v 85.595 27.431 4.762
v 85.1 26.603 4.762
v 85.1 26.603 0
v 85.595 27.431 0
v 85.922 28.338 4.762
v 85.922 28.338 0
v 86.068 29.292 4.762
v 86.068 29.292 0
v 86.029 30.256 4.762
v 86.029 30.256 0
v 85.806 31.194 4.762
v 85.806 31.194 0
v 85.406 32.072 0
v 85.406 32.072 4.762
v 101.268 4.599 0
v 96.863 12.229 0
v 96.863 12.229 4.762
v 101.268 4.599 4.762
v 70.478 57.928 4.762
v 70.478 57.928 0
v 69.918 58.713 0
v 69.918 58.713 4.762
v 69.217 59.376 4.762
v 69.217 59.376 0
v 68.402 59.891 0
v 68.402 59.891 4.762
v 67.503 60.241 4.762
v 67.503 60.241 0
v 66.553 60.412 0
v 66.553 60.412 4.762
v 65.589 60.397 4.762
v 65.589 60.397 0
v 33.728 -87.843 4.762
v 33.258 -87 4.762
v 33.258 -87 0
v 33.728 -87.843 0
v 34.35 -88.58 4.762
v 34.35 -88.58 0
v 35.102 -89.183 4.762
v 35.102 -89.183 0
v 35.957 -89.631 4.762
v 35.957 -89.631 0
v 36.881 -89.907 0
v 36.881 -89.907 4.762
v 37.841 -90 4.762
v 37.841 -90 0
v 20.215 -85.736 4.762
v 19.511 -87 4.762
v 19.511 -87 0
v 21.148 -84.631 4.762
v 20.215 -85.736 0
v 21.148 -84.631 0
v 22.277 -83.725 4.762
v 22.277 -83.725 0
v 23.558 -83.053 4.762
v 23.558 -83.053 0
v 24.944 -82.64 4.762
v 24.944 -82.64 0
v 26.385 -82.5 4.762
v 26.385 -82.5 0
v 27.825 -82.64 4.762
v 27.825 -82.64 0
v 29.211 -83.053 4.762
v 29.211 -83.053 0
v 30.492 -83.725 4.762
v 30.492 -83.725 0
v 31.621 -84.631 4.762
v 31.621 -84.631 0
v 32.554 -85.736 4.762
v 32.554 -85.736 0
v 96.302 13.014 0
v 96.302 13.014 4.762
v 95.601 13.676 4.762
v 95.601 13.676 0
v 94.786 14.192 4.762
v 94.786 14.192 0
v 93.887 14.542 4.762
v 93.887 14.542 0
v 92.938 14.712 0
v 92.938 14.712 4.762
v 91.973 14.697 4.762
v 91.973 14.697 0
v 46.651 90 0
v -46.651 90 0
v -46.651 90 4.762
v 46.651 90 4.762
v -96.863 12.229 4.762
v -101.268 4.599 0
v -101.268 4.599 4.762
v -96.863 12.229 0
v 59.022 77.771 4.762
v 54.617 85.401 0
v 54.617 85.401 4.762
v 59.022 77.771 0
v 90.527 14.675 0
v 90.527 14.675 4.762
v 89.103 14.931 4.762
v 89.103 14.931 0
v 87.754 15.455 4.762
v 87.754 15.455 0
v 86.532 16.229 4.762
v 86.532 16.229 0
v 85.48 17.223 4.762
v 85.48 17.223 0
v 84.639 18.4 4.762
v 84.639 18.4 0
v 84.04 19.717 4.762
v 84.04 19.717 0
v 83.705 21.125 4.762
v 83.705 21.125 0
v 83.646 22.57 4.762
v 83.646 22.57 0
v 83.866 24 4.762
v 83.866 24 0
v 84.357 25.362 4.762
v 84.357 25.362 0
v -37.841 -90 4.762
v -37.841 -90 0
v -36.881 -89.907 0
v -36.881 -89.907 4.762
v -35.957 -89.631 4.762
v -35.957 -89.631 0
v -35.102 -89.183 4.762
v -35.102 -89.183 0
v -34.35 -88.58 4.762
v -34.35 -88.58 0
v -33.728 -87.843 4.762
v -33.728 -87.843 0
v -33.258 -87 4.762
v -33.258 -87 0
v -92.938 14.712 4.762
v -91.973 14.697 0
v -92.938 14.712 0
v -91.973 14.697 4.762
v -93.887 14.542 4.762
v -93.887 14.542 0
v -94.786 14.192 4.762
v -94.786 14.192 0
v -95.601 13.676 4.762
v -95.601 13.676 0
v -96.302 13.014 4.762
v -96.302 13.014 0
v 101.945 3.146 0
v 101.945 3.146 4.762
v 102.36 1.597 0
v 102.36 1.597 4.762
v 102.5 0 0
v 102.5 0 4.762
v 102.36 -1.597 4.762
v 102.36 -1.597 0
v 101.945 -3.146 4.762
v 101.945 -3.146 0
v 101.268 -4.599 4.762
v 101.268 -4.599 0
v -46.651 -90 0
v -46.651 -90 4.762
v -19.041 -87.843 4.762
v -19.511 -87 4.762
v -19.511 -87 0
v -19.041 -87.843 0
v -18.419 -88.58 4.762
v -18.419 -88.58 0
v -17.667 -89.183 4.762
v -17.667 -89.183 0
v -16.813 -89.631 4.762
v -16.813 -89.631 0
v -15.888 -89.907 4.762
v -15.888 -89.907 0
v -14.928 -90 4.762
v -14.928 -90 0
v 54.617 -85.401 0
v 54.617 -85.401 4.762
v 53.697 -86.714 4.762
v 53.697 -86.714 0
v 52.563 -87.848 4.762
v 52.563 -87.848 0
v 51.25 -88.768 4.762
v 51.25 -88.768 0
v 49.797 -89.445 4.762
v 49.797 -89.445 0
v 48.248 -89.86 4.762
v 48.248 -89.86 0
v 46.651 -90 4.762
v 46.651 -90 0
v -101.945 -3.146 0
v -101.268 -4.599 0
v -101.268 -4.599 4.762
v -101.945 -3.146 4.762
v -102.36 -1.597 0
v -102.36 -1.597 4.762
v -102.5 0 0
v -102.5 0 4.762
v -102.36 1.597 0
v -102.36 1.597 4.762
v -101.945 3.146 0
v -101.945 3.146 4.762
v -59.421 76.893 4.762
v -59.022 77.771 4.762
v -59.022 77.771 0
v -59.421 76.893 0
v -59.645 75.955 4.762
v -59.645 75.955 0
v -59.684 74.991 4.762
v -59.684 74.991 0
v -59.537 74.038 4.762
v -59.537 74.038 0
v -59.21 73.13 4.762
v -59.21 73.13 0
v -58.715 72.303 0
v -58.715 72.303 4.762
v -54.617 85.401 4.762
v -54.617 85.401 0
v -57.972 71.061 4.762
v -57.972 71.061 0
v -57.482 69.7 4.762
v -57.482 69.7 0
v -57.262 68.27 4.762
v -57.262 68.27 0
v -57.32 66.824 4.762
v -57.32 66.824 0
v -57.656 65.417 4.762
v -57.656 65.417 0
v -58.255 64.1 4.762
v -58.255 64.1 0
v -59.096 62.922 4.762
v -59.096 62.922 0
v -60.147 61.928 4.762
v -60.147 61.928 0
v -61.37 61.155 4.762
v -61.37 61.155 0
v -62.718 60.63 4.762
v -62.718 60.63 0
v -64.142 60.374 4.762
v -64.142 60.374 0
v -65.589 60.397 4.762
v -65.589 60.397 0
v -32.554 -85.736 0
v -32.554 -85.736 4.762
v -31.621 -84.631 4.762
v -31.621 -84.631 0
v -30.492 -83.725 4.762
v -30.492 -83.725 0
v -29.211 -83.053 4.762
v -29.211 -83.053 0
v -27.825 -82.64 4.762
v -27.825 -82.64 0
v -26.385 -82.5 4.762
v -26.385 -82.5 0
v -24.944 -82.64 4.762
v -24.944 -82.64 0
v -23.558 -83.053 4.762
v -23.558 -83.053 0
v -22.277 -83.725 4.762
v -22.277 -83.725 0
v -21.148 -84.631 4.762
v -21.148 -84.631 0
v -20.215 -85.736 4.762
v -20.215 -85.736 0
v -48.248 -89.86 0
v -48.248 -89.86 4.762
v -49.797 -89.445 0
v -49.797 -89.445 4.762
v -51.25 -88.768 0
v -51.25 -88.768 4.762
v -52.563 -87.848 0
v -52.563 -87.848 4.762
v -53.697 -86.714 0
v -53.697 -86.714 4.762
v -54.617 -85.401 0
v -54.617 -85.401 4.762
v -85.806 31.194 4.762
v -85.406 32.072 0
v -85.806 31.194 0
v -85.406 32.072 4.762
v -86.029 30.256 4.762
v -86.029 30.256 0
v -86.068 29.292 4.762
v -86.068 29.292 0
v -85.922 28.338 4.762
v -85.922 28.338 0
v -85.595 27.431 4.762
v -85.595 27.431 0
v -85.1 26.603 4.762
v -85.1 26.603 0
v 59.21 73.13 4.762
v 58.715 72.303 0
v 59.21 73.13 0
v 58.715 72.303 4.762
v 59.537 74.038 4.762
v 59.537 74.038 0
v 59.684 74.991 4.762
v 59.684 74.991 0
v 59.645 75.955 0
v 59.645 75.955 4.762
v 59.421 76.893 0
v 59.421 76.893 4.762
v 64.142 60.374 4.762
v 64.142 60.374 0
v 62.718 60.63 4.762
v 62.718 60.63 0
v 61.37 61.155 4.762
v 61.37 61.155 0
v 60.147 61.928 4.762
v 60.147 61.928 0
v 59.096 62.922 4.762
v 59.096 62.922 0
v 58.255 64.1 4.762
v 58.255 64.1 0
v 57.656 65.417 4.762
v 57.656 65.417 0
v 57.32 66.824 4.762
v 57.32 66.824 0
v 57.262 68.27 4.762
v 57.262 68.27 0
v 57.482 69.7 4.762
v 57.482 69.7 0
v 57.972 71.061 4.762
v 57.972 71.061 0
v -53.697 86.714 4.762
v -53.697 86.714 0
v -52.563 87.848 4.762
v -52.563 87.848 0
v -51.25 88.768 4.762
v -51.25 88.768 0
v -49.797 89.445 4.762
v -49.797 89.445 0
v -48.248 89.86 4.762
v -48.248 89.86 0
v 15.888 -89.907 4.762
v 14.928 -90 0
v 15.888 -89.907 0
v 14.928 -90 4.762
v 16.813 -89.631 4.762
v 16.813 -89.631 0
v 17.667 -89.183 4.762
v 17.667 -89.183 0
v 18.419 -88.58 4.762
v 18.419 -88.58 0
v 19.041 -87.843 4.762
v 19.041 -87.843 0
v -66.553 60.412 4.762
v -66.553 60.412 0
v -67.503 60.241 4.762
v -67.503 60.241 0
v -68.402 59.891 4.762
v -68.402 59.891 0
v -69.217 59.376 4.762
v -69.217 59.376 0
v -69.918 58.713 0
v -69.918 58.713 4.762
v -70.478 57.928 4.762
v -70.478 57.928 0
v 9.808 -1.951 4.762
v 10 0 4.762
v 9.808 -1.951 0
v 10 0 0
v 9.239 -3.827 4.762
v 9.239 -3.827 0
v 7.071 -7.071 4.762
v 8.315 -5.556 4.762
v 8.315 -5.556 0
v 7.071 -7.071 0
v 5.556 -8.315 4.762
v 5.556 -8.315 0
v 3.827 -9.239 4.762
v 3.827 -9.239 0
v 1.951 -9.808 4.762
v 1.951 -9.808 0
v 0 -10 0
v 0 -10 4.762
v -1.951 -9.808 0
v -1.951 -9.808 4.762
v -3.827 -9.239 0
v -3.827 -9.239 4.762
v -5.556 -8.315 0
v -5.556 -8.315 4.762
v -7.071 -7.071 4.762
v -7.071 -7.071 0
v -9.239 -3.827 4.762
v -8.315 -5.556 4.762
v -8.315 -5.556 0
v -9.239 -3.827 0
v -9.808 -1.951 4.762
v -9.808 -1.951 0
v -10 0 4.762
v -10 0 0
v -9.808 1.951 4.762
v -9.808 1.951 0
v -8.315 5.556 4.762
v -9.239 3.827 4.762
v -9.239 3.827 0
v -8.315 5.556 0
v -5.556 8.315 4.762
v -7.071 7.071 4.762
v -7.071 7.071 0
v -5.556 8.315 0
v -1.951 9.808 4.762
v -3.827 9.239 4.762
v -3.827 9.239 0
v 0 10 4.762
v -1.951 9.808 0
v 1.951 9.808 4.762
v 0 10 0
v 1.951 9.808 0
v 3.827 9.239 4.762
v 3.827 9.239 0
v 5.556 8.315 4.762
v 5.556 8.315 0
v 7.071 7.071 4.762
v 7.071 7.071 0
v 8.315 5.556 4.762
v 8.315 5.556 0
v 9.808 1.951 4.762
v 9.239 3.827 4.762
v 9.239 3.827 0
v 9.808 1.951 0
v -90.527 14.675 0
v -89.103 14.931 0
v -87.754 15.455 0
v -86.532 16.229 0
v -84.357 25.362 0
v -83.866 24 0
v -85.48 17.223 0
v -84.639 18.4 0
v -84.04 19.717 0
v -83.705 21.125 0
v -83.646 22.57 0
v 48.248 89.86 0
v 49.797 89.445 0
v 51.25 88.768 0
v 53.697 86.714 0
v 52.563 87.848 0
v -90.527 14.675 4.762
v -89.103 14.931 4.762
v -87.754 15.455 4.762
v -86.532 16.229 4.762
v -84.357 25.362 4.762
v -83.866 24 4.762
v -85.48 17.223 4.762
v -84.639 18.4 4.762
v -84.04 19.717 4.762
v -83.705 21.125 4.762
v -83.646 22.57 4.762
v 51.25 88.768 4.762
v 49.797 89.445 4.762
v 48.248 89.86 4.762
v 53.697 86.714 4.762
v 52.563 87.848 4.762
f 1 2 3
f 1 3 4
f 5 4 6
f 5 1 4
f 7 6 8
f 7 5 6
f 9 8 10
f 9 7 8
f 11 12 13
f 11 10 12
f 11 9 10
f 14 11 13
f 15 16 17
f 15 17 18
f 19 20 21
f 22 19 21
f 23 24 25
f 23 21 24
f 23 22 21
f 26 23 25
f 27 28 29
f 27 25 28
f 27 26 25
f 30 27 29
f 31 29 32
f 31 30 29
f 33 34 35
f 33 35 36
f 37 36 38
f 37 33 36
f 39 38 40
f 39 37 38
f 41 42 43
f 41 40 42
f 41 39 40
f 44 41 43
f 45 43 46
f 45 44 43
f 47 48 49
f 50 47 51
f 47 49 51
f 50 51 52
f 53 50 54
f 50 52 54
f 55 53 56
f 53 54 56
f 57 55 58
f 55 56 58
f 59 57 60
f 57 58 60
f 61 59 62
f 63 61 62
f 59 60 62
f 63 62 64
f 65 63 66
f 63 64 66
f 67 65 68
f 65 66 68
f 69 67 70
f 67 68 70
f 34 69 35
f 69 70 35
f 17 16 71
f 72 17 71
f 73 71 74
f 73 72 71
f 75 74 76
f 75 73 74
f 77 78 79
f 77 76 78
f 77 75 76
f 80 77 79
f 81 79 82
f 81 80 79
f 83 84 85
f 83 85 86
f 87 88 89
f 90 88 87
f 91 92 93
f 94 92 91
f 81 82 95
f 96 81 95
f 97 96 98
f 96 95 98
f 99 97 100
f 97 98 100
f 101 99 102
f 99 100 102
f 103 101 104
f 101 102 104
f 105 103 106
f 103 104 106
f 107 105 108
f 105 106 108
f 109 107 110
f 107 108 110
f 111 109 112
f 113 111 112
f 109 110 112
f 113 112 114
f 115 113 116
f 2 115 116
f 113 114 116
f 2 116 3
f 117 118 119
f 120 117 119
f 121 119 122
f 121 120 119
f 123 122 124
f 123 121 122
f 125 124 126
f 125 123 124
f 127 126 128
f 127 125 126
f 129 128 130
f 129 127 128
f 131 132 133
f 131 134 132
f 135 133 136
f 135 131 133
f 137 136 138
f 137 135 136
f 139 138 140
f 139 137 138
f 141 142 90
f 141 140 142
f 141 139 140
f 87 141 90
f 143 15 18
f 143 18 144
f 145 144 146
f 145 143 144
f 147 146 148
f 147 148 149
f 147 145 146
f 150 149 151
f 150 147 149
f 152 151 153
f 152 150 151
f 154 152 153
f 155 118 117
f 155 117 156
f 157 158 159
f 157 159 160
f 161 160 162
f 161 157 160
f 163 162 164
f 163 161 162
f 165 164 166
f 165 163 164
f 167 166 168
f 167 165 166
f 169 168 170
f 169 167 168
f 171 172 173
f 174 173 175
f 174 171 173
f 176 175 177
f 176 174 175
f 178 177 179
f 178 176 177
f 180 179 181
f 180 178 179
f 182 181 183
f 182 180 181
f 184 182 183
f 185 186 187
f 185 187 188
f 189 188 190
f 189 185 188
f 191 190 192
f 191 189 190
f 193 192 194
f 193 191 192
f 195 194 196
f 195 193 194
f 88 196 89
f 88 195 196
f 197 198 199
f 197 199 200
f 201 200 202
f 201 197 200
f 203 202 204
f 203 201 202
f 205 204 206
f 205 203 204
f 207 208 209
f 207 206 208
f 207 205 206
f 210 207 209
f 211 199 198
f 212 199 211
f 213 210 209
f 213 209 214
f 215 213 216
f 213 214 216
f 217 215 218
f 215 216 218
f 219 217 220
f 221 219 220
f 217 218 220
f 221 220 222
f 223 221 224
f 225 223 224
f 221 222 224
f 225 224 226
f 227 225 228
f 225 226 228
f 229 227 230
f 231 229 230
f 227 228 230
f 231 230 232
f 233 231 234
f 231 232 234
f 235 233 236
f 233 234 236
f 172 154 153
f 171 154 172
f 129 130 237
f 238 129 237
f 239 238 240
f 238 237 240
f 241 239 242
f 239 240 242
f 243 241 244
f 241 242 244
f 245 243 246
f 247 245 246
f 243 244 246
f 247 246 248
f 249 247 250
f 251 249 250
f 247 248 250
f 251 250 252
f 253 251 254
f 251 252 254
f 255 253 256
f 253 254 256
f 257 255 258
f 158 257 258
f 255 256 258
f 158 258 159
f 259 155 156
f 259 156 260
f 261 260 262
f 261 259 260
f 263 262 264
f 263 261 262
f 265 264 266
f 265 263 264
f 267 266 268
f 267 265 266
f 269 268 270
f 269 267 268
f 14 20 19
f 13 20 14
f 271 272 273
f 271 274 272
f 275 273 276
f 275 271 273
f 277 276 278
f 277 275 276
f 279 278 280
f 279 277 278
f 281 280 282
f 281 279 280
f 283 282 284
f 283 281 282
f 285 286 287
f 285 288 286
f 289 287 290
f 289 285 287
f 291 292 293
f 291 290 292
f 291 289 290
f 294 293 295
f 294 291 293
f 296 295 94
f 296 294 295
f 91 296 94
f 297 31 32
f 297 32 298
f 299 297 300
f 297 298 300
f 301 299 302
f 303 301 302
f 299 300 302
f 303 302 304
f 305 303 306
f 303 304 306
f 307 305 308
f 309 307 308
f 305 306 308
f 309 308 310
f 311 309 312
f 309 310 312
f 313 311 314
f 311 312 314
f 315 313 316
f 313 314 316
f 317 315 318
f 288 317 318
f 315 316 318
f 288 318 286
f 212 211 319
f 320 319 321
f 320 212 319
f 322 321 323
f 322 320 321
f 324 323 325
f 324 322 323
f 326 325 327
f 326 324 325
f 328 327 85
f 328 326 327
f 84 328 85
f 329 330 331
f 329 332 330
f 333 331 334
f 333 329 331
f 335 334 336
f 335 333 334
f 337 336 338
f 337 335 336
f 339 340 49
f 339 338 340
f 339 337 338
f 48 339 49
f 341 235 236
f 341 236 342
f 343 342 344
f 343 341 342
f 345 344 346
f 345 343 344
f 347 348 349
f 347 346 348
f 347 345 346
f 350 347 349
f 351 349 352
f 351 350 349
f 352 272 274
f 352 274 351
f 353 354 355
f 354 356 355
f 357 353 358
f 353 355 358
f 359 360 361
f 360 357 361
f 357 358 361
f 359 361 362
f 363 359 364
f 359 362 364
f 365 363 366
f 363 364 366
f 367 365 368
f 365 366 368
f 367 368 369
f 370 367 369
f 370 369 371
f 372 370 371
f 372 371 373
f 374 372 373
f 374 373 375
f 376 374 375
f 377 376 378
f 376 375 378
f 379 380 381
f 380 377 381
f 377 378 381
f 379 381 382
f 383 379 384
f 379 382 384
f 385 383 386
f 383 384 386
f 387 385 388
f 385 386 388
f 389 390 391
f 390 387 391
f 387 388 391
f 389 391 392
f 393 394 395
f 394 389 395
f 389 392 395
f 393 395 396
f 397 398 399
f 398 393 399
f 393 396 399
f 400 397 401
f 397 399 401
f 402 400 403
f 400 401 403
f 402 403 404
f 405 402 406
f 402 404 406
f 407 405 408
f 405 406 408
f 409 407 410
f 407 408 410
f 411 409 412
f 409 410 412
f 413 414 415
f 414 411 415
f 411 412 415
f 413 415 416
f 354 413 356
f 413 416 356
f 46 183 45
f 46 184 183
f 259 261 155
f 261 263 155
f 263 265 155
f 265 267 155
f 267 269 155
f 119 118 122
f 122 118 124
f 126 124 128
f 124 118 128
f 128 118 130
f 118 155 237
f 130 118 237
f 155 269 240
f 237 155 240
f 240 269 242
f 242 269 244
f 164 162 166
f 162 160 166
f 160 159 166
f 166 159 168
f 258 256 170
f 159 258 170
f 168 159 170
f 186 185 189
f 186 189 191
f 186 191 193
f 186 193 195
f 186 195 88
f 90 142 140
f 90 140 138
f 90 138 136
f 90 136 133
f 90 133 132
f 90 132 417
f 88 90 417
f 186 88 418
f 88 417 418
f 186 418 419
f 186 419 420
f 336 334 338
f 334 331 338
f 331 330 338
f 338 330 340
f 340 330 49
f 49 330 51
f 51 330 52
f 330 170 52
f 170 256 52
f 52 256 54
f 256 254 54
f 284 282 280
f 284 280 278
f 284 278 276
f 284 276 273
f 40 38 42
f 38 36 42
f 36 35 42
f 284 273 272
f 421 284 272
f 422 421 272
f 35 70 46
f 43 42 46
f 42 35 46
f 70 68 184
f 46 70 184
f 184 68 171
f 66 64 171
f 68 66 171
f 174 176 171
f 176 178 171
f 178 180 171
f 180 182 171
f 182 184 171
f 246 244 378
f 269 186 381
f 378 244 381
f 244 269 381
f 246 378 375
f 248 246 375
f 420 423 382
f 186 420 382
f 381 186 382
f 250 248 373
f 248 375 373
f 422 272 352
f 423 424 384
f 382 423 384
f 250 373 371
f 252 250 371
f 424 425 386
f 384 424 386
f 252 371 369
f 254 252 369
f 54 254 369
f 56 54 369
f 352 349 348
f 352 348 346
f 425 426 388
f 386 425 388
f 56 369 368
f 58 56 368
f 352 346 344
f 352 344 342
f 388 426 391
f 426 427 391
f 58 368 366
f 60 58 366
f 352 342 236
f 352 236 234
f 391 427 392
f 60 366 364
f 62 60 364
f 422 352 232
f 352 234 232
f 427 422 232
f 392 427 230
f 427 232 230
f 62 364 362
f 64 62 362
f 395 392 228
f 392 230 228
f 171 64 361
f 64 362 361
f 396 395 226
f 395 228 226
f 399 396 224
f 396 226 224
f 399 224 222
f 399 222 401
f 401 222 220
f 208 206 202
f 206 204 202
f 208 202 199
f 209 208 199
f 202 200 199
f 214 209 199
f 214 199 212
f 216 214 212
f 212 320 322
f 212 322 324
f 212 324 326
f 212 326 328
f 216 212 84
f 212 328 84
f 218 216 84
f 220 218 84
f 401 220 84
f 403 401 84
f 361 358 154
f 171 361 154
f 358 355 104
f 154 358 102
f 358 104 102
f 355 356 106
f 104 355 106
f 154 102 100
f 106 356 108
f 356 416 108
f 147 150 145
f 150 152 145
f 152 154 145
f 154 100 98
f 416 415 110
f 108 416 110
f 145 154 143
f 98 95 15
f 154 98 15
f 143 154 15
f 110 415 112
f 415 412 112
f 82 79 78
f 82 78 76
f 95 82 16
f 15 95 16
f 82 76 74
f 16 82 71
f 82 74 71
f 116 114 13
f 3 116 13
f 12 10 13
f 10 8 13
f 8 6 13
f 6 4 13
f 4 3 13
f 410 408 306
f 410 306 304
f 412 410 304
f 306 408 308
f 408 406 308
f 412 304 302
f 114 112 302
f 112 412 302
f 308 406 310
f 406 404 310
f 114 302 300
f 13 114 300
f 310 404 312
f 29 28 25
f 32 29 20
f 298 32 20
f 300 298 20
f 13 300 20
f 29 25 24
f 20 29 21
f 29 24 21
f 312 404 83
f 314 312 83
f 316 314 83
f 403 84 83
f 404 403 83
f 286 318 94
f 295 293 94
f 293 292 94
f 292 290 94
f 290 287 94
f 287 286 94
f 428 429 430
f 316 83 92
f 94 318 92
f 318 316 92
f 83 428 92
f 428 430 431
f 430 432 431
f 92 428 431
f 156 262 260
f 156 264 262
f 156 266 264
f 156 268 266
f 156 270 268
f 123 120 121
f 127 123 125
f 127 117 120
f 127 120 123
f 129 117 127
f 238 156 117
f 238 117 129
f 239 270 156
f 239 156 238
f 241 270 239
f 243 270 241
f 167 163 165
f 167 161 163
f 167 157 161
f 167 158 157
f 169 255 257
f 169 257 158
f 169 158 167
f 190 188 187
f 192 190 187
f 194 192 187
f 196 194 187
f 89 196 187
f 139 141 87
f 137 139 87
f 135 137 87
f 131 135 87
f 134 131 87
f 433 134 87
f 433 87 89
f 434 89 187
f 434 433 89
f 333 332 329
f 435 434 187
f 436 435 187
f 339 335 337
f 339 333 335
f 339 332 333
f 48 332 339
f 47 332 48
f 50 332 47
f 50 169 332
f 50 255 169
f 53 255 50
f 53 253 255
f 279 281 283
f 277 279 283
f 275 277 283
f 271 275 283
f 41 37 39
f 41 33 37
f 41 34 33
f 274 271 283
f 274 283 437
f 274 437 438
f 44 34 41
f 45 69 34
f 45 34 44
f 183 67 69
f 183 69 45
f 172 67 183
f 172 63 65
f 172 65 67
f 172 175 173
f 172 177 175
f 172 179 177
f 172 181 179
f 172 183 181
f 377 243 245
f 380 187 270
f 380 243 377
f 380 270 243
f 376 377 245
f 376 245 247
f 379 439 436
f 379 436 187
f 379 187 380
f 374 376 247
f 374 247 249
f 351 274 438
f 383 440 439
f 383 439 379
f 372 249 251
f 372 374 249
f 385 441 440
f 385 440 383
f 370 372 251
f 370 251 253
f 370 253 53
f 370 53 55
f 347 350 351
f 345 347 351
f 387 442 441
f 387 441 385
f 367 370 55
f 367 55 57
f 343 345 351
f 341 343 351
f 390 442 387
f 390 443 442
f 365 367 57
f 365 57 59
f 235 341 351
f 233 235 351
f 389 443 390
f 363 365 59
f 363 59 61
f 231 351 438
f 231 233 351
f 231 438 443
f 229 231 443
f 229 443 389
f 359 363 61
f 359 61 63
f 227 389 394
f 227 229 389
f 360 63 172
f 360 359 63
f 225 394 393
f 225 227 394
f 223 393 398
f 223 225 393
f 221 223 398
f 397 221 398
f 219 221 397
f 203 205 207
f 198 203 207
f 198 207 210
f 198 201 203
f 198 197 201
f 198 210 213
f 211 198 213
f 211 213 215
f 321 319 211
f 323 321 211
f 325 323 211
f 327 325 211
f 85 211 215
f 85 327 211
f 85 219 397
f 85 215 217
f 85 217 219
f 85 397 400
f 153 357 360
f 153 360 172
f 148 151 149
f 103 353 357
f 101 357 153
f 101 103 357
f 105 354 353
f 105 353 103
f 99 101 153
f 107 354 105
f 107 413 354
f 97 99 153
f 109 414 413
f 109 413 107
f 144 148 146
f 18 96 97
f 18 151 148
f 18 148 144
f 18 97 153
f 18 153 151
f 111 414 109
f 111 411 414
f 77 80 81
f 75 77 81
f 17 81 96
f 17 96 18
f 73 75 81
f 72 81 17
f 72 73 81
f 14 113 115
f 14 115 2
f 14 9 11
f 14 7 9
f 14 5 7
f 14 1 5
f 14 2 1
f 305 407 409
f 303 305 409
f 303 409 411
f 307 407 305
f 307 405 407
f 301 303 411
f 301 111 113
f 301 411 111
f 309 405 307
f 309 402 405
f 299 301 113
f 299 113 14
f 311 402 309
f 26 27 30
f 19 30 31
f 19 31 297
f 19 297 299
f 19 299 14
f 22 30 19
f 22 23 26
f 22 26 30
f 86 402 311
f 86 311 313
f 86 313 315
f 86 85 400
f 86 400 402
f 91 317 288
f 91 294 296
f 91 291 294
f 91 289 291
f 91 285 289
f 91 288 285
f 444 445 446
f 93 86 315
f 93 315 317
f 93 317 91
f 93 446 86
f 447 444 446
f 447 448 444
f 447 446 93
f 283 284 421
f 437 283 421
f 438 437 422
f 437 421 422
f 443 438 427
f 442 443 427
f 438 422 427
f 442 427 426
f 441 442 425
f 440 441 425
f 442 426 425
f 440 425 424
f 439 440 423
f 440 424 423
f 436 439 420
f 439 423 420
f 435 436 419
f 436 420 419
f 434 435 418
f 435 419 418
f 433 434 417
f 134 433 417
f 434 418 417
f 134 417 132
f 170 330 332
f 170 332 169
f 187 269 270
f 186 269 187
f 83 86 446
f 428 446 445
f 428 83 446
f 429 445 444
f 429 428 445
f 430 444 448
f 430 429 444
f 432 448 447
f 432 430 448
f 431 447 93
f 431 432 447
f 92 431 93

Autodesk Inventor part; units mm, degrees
ref_plane "YZ Plane" through (0, 0, 0) normal (1, 0, 0) x (0, 1, 0)
ref_plane "XZ Plane" through (0, 0, 0) normal (0, 1, 0) x (-1, 0, 0)
ref_plane "XY Plane" through (0, 0, 0) normal (0, 0, 1) x (1, 0, 0)
sketch "Sketch1" plane through (0, 0, 0) normal (0, 0, 1) x (1, 0, 0)
  line L0 (51.9615, 90) -> (103.923, 0)
  line L1 (103.923, 0) -> (51.9615, -90)
  line L2 (51.9615, -90) -> (-51.9615, -90)
  line L3 (-51.9615, -90) -> (-103.923, 0)
  line L4 (-103.923, 0) -> (-51.9615, 90)
  line L5 (-51.9615, 90) -> (51.9615, 90)
  circle A0 centre (0, 0) radius 10
  dimension "d3" = 180
  dimension "d13" = 20
extrude "Extrusion1" add sketch "Sketch1" along normal blind 4.7625
sketch "Sketch2" plane through (0, 0, 0) normal (0, 0, -1) x (-1, 0, 0)
  line L0 (-51.9615, 90) -> (-103.923, 0) projected
  line L1 (51.9615, -90) -> (103.923, 0) projected
  line L2 (103.923, 0) -> (51.9615, 90) projected
  line L3 (51.9615, 90) -> (-51.9615, 90) projected
  line L4 (-51.9615, 90) -> (0, 180) construction
  line L5 (0, 180) -> (51.9615, 90) construction
  arc A0 (-68.5, 61.3545) -> (-61, 74.3449) centre (-64.75, 67.8497) ccw
  arc A1 (-46.6506, 90) -> (-54.617, 85.4006) centre (-46.6506, 80.8013) ccw
  arc A2 (-94.8846, 15.6551) -> (-87.3846, 28.6455) centre (-91.1346, 22.1503) ccw
  line L6 (-103.923, 0) -> (-155.8846, -90) construction
  line L7 (-155.8846, -90) -> (-51.9615, -90) construction
  line L8 (-103.923, 0) -> (-51.9615, -90) projected
  arc A3 (-101.2676, 4.5994) -> (-101.2676, -4.5994) centre (-93.3013, 0) ccw
  point P0 (0, 0)
  dimension "d5" = 7.5
  dimension "d6" = 129.5
  dimension "d7" = 9.1987
  dimension "d8" = 93.3013
  dimension "d9" = 129.5
extrude "Extrusion2" cut sketch "Sketch2" against normal up to next
pattern_circular "Circular Pattern1" count 3 over 360 about axis through (0, 0, 0) along (0, 0, 1) of "Extrusion2"
fillet "Fillet1" radius 5 12 edges at (61, 74.3449, 2.3813) (68.5, 61.3545, 2.3813) (87.3846, 28.6455, 2.3813) (94.8846, 15.6551, 2.3813) (-68.5, 61.3545, 2.3813) (-61, 74.3449, 2.3813) (-94.8846, 15.6551, 2.3813) (-87.3846, 28.6455, 2.3813) (-18.8846, -90, 2.3813) (-33.8846, -90, 2.3813) (33.8846, -90, 2.3813) (18.8846, -90, 2.3813)
equation "\"d9\" = d6"
properties part number "Heatbed_Insulator_Cork" material "Cork Tiles"
